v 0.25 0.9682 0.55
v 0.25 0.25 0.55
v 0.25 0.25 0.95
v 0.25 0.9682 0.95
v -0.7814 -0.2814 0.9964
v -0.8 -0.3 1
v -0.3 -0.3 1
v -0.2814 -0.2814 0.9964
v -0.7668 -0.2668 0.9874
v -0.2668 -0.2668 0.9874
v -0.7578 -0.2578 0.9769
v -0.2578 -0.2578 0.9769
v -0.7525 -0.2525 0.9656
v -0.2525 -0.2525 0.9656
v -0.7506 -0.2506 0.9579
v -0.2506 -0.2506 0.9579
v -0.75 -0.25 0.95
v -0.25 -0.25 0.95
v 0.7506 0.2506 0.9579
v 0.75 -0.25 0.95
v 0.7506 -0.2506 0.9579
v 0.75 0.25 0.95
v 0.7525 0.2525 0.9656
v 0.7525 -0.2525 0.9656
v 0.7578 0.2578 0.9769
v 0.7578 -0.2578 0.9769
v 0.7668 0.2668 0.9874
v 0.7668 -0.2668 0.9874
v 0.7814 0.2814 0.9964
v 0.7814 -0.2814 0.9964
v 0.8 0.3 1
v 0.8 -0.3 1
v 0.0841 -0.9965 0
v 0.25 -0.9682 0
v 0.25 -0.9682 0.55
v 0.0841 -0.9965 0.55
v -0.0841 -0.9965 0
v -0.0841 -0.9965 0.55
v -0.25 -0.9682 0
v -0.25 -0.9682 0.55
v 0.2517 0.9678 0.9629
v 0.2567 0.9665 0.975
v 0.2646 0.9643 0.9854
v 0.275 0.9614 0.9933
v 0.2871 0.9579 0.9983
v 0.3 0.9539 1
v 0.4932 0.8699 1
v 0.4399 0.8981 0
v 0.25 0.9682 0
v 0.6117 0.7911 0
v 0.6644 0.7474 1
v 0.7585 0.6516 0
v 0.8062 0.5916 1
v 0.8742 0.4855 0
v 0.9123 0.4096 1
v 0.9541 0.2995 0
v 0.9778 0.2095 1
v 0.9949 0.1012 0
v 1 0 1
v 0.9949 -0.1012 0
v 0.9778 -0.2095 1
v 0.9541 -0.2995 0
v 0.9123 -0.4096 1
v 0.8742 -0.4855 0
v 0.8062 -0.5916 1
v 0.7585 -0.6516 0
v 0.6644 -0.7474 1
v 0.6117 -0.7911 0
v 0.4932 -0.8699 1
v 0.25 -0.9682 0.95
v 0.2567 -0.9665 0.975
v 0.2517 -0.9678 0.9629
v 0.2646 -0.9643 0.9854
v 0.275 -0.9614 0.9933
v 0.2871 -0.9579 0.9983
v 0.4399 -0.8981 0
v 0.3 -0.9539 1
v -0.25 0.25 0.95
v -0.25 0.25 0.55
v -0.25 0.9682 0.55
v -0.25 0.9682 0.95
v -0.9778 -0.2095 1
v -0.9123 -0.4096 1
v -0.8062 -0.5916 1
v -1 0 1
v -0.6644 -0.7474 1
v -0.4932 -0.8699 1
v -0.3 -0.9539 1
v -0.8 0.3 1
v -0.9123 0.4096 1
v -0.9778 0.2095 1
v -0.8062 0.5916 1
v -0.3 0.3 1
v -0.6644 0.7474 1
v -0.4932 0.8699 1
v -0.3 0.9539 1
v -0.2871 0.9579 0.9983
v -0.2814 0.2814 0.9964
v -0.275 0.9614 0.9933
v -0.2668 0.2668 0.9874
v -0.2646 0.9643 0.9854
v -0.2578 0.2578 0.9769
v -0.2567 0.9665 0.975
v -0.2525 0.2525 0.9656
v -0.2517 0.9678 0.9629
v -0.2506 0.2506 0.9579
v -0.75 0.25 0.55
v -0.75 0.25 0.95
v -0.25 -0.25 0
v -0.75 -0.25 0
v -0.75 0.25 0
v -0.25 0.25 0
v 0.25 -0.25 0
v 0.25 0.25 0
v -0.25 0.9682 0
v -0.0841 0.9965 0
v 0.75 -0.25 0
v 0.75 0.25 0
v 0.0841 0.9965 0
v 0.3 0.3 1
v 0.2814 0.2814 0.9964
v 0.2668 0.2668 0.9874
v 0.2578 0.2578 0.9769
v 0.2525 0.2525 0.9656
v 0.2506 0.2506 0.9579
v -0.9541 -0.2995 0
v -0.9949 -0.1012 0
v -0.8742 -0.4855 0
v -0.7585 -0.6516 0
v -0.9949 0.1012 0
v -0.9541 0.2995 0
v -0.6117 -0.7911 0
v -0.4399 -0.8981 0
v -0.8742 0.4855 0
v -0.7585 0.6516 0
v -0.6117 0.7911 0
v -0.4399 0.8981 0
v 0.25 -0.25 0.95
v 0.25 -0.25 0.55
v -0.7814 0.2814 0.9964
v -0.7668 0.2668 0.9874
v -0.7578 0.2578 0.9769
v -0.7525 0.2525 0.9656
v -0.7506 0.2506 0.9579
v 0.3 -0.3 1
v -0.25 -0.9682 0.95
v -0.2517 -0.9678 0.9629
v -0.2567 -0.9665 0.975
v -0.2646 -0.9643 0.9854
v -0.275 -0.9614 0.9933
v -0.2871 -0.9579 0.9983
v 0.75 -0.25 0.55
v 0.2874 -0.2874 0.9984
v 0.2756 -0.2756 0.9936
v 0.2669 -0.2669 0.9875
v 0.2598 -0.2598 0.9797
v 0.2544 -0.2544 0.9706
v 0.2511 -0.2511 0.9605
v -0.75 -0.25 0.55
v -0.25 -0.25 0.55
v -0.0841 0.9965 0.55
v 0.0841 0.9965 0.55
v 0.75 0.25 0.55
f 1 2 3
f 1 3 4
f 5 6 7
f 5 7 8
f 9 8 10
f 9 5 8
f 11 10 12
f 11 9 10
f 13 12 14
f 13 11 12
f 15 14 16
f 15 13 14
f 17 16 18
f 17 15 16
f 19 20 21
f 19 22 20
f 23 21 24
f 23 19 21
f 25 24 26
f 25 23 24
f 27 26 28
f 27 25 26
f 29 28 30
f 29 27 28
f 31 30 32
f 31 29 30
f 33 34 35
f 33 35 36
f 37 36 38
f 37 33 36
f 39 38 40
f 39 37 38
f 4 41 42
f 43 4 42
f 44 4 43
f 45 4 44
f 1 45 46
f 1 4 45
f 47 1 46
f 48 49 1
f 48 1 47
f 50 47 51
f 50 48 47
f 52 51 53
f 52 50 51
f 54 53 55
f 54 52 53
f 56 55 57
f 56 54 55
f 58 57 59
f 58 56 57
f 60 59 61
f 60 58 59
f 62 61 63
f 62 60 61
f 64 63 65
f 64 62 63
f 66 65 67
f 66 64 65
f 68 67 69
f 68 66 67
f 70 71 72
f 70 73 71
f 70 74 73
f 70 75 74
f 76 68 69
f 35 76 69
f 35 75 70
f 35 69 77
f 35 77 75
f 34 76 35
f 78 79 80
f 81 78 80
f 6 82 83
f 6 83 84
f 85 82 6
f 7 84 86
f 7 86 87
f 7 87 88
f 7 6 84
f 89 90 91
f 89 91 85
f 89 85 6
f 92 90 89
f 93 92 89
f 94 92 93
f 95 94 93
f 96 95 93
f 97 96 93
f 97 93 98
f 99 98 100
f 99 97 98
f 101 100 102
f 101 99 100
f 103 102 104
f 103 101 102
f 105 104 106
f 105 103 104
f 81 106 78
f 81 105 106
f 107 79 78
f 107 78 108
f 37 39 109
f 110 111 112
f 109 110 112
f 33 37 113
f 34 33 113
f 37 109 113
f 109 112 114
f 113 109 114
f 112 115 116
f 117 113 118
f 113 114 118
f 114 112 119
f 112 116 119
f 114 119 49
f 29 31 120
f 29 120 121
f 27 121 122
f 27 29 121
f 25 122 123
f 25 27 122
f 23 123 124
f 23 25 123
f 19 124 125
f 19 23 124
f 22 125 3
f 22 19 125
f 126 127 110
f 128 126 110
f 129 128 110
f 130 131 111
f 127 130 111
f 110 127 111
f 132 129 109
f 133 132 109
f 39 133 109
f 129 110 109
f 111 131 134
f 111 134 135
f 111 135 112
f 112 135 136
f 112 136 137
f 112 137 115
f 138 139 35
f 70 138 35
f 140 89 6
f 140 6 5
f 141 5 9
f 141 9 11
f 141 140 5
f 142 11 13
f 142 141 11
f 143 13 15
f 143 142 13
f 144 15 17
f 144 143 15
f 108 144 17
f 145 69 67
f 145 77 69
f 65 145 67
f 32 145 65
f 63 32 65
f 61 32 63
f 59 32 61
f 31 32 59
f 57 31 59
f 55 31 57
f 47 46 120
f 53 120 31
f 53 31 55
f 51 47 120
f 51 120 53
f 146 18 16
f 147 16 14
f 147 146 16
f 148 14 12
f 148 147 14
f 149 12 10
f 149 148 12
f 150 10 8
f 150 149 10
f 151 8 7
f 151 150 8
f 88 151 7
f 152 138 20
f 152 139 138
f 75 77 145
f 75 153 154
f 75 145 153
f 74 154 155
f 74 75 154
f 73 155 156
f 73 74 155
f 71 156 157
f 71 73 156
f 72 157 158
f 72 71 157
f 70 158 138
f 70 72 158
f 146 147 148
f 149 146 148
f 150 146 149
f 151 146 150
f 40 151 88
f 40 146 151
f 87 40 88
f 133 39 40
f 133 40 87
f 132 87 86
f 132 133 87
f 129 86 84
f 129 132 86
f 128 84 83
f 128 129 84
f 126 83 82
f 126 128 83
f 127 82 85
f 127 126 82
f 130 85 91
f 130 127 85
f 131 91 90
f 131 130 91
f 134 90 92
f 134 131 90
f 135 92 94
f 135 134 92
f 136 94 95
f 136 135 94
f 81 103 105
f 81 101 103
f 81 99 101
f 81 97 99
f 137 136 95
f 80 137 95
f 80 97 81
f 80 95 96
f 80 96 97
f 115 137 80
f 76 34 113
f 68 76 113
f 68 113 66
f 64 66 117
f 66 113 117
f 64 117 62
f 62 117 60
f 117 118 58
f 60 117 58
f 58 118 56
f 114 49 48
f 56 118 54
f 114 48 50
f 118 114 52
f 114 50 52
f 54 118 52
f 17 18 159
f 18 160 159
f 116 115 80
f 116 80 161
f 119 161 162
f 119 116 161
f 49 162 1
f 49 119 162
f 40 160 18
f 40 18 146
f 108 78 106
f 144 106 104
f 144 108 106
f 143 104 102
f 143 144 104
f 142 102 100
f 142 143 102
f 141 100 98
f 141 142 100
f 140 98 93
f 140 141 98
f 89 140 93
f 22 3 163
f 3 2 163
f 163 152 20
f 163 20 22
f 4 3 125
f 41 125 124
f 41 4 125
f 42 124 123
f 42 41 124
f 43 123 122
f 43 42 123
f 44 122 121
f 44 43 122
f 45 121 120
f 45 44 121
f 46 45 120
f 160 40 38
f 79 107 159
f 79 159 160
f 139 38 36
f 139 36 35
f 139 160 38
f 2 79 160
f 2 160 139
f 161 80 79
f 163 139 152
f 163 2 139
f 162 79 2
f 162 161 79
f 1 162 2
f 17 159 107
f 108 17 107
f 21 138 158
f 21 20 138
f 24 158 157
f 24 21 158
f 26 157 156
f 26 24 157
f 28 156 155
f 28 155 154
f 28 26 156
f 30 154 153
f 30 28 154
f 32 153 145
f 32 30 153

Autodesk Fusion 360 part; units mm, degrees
sketch "Sketch1" plane through (0, 0, 0) normal (0, 0, 1) x (1, 0, 0)
  circle A0 centre (0, 0) radius 1
  line L0 (0.25, 0.25) -> (0.25, 0.9682)
  line L1 (0.25, -0.25) -> (0.25, -0.9682)
  line L2 (-0.25, 0.25) -> (-0.25, 0.9682)
  line L3 (-0.25, -0.25) -> (-0.25, -0.9682)
  line L4 (0.25, 0.25) -> (0.75, 0.25)
  line L5 (0.25, -0.25) -> (0.75, -0.25)
  line L6 (-0.25, -0.25) -> (-0.75, -0.25)
  line L7 (-0.25, 0.25) -> (-0.75, 0.25)
  line L8 (-0.75, -0.25) -> (-0.75, 0.25)
  line L9 (0.75, -0.25) -> (0.75, 0.25)
extrude "Extrude2" add sketch "Sketch1" along normal blind 0.55 contours A0 L0 L1 L2 L3 L4 L5 L6 L7 L8 L9
extrude "Extrude3" add sketch "Sketch1" along normal blind 1 contours A0 L0 L1 L4 L5 L9 | A0 L2 L3 L6 L7 L8
fillet "Fillet1" radius 0.05 10 edges at (-0.5, 0.25, 1) (-0.25, 0.6091, 1) (-0.75, 0, 1) (-0.5, -0.25, 1) (-0.25, -0.6091, 1) (0.25, -0.6091, 1) (0.5, -0.25, 1) (0.5, 0.25, 1) (0.75, 0, 1) (0.25, 0.6091, 1)
